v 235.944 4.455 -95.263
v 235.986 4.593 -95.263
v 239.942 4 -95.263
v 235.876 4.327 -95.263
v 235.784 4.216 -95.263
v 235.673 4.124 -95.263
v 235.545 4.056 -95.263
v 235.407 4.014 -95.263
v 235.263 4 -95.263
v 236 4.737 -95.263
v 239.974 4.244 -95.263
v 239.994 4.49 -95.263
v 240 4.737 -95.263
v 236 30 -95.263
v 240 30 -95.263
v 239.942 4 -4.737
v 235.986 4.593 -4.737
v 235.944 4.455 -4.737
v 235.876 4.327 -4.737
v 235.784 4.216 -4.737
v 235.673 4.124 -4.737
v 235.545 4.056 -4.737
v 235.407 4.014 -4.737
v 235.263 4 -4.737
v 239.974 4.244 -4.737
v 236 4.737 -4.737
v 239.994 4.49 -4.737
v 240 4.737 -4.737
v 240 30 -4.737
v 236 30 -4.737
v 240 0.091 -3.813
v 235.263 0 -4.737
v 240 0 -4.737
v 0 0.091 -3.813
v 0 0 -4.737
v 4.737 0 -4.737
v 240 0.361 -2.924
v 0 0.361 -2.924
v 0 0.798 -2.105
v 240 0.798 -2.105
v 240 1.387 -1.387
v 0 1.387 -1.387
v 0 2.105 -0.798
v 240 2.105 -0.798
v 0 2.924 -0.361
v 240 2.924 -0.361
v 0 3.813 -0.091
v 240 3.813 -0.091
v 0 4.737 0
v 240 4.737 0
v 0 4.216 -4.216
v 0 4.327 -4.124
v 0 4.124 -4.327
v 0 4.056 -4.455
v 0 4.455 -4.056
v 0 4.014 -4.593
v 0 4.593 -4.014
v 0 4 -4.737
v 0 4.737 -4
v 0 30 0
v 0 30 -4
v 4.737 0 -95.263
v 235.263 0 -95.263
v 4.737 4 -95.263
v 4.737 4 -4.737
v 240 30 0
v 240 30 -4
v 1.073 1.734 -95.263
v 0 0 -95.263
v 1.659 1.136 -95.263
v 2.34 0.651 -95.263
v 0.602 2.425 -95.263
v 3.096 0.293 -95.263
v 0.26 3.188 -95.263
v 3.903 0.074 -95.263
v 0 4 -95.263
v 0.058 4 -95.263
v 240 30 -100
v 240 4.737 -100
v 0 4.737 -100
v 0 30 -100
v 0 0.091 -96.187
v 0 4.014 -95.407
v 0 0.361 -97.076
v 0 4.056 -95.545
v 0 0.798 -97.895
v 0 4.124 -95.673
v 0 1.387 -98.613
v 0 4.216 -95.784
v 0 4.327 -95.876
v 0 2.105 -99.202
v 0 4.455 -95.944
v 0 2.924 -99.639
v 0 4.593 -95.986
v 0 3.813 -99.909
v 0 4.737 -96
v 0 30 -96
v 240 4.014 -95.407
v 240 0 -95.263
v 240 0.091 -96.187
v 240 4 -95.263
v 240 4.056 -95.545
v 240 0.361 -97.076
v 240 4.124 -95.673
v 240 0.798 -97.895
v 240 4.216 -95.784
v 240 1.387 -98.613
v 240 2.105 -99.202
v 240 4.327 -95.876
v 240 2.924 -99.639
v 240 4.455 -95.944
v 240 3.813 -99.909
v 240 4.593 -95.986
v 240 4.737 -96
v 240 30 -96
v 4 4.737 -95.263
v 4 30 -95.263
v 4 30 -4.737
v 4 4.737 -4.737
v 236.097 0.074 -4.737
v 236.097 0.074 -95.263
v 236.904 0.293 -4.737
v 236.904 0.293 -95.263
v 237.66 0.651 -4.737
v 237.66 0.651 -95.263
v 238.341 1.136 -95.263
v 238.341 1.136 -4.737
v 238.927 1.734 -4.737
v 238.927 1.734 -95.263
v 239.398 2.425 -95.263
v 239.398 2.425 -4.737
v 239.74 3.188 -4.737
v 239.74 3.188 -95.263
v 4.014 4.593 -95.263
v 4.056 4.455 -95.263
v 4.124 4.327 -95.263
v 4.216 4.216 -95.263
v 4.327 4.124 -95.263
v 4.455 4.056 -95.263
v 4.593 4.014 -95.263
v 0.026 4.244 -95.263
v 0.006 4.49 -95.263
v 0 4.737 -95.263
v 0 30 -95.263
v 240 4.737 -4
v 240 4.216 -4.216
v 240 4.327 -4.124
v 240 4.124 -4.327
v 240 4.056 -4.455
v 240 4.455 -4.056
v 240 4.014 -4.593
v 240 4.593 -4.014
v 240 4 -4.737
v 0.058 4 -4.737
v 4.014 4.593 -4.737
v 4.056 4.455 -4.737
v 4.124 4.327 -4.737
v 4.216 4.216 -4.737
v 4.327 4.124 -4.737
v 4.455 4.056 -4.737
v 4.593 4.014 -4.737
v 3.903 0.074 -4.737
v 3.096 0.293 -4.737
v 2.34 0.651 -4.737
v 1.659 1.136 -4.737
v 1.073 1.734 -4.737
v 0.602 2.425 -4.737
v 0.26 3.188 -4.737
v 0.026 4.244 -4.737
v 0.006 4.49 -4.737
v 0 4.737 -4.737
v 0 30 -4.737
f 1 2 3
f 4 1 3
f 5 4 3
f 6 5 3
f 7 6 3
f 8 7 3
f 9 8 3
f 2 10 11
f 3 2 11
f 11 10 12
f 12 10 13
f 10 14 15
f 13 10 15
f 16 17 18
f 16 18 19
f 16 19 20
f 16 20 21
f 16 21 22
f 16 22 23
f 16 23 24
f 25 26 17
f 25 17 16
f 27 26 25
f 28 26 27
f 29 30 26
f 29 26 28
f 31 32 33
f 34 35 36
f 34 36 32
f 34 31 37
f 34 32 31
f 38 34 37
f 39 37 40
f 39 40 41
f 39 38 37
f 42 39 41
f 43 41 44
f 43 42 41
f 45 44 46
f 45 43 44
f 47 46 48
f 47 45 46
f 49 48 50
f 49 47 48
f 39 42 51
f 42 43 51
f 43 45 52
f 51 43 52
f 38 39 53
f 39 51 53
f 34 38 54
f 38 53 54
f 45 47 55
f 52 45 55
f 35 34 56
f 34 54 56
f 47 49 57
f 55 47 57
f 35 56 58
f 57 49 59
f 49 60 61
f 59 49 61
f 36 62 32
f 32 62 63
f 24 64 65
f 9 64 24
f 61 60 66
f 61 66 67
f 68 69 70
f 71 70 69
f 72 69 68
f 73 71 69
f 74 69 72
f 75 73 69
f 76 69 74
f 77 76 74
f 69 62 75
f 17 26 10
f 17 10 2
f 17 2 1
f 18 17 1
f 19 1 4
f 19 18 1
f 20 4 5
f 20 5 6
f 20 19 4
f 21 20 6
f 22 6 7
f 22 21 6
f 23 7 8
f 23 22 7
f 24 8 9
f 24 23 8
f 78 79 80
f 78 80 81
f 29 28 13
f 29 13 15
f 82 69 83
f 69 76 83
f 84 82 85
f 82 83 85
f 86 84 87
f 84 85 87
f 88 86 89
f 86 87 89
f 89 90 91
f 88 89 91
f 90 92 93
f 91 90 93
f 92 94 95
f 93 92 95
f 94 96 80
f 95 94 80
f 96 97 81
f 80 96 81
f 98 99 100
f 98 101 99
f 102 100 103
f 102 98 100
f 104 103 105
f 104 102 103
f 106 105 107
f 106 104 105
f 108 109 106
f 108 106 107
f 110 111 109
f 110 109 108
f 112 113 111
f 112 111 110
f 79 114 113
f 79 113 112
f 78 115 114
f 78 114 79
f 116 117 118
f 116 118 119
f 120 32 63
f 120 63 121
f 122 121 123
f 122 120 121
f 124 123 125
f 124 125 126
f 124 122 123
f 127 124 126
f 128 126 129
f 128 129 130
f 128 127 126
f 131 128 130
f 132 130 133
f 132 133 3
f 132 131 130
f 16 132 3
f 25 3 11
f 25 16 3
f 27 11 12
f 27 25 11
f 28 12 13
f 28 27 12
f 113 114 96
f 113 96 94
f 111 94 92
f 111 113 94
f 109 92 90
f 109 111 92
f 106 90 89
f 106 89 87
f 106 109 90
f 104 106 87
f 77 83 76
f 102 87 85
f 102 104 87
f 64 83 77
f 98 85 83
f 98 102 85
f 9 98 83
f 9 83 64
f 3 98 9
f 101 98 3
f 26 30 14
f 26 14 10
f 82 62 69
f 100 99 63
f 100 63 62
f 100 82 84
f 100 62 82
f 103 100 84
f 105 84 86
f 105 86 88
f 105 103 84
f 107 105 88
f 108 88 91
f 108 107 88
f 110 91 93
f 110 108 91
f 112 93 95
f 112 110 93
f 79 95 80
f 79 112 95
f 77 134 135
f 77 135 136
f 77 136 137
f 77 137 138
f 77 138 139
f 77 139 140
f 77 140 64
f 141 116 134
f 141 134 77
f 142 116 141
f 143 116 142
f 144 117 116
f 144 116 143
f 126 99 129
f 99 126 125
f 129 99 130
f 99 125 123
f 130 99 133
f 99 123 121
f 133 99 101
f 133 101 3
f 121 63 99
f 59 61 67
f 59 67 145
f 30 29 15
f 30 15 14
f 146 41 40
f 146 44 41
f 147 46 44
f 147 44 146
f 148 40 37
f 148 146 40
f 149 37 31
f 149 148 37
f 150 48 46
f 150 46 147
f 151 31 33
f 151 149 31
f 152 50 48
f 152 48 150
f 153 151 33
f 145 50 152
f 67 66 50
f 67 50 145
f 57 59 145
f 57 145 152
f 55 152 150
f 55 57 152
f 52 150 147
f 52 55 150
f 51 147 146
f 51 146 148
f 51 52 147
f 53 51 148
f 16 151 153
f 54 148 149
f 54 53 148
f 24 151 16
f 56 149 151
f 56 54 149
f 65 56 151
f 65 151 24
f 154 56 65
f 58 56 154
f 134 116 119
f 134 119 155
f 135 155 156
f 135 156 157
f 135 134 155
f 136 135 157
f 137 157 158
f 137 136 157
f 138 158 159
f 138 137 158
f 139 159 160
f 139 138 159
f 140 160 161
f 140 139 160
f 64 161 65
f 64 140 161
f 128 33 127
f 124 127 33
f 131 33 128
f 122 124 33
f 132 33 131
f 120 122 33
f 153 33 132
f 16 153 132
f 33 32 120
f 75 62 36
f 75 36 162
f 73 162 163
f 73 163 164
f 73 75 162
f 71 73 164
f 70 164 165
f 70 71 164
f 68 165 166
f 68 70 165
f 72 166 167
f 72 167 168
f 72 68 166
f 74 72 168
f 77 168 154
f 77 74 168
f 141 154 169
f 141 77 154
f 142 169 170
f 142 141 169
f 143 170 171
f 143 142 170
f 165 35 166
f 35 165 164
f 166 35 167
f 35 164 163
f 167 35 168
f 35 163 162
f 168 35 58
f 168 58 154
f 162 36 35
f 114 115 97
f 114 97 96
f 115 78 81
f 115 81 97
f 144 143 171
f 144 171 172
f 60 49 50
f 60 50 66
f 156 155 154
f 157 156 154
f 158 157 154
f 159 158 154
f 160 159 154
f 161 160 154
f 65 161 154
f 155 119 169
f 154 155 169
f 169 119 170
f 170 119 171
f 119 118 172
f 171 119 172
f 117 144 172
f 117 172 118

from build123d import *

# Parameters (mm, degrees)
CROQUIS2_W                         = 240
CROQUIS2_H                         = 100
BRIDA_BASE1_DEPTH                  = 4
BRIDA_DE_ARISTA1_STRIP_W           = 17.4732
BRIDA_DE_ARISTA1_STRIP_H           = 4
BRIDA_DE_ARISTA1_STRIP_CUT_DEPTH   = 240
BRIDA_DE_ARISTA1_STRIP_2_W         = 17.4732
BRIDA_DE_ARISTA1_STRIP_2_H         = 4
BRIDA_DE_ARISTA1_STRIP_CUT_2_DEPTH = 240
BRIDA_DE_ARISTA1_DEPTH             = 240
BRIDA_DE_ARISTA1_BEND_DEPTH        = 240
BRIDA_DE_ARISTA2_STRIP_W           = 17.4732
BRIDA_DE_ARISTA2_STRIP_H           = 4
BRIDA_DE_ARISTA2_STRIP_CUT_DEPTH   = 90.5268
BRIDA_DE_ARISTA2_STRIP_2_W         = 17.4732
BRIDA_DE_ARISTA2_STRIP_2_H         = 4
BRIDA_DE_ARISTA2_STRIP_CUT_2_DEPTH = 90.5268
BRIDA_DE_ARISTA2_DEPTH             = 90.5268
BRIDA_DE_ARISTA2_BEND_DEPTH        = 90.5268


# Sheet-metal steps are written as plain solids
with BuildPart() as part:
    # Croquis2 → Brida base1 (new body)
    with BuildSketch(Plane(origin=(0, 0, 0), x_dir=(1, 0, 0), z_dir=(0, 1, 0))):
        with Locations((120, 50)):
            Rectangle(CROQUIS2_W, CROQUIS2_H)
    extrude(amount=BRIDA_BASE1_DEPTH)

    # Brida de arista1 strip (across the edge) → Brida de arista1 strip cut (cut)
    with BuildSketch(Plane(origin=(0, 4, 0), x_dir=(0, 0, -1), z_dir=(1, 0, 0))):
        with Locations((-4, -2)):
            Rectangle(BRIDA_DE_ARISTA1_STRIP_W, BRIDA_DE_ARISTA1_STRIP_H)
    extrude(amount=BRIDA_DE_ARISTA1_STRIP_CUT_DEPTH, mode=Mode.SUBTRACT)

    # Brida de arista1 strip 2 (across the edge) → Brida de arista1 strip cut 2 (cut)
    with BuildSketch(Plane(origin=(240, 4, -100), x_dir=(0, 0, 1), z_dir=(-1, 0, 0))):
        with Locations((-4, -2)):
            Rectangle(BRIDA_DE_ARISTA1_STRIP_2_W, BRIDA_DE_ARISTA1_STRIP_2_H)
    extrude(amount=BRIDA_DE_ARISTA1_STRIP_CUT_2_DEPTH, mode=Mode.SUBTRACT)

    # Brida de arista1 section (across the edge) → Brida de arista1 (add)
    with BuildSketch(Plane(origin=(0, 4, 0), x_dir=(0, 0, -1), z_dir=(1, 0, 0))):
        with BuildLine():
            Line((0, 0.7366), (0, 26))
            Line((0, 26), (4, 26))
            Line((4, 26), (4, 0.7366))
            ThreePointArc((4, 0.7366), (4.215745145, 0.215745145), (4.7366, 0))
            Line((4.7366, 0), (4.7366, -4))
            ThreePointArc((4.7366, -4), (1.38731802, -2.61268198), (0, 0.7366))
        make_face()
    extrude(amount=BRIDA_DE_ARISTA1_DEPTH)

    # Brida de arista1 section 2 (across the edge) → Brida de arista1 bend (add)
    with BuildSketch(Plane(origin=(240, 4, -100), x_dir=(0, 0, 1), z_dir=(-1, 0, 0))):
        with BuildLine():
            Line((0, 0.7366), (0, 26))
            Line((0, 26), (4, 26))
            Line((4, 26), (4, 0.7366))
            ThreePointArc((4, 0.7366), (4.215745145, 0.215745145), (4.7366, 0))
            Line((4.7366, 0), (4.7366, -4))
            ThreePointArc((4.7366, -4), (1.38731802, -2.61268198), (0, 0.7366))
        make_face()
    extrude(amount=BRIDA_DE_ARISTA1_BEND_DEPTH)

    # Brida de arista2 strip (across the edge) → Brida de arista2 strip cut (cut)
    with BuildSketch(Plane(origin=(240, 4, -4.7366), x_dir=(-1, 0, 0), z_dir=(0, 0, -1))):
        with Locations((-4, -2)):
            Rectangle(BRIDA_DE_ARISTA2_STRIP_W, BRIDA_DE_ARISTA2_STRIP_H)
    extrude(amount=BRIDA_DE_ARISTA2_STRIP_CUT_DEPTH, mode=Mode.SUBTRACT)

    # Brida de arista2 strip 2 (across the edge) → Brida de arista2 strip cut 2 (cut)
    with BuildSketch(Plane(origin=(0, 4, -95.2634), x_dir=(1, 0, 0), z_dir=(0, 0, 1))):
        with Locations((-4, -2)):
            Rectangle(BRIDA_DE_ARISTA2_STRIP_2_W, BRIDA_DE_ARISTA2_STRIP_2_H)
    extrude(amount=BRIDA_DE_ARISTA2_STRIP_CUT_2_DEPTH, mode=Mode.SUBTRACT)

    # Brida de arista2 section (across the edge) → Brida de arista2 (add)
    with BuildSketch(Plane(origin=(240, 4, -4.7366), x_dir=(-1, 0, 0), z_dir=(0, 0, -1))):
        with BuildLine():
            Line((0, 0.7366), (0, 26))
            Line((0, 26), (4, 26))
            Line((4, 26), (4, 0.7366))
            ThreePointArc((4, 0.7366), (4.215745145, 0.215745145), (4.7366, 0))
            Line((4.7366, 0), (4.7366, -4))
            ThreePointArc((4.7366, -4), (1.38731802, -2.61268198), (0, 0.7366))
        make_face()
    extrude(amount=BRIDA_DE_ARISTA2_DEPTH)

    # Brida de arista2 section 2 (across the edge) → Brida de arista2 bend (add)
    with BuildSketch(Plane(origin=(0, 4, -95.2634), x_dir=(1, 0, 0), z_dir=(0, 0, 1))):
        with BuildLine():
            Line((0, 0.7366), (0, 26))
            Line((0, 26), (4, 26))
            Line((4, 26), (4, 0.7366))
            ThreePointArc((4, 0.7366), (4.215745145, 0.215745145), (4.7366, 0))
            Line((4.7366, 0), (4.7366, -4))
            ThreePointArc((4.7366, -4), (1.38731802, -2.61268198), (0, 0.7366))
        make_face()
    extrude(amount=BRIDA_DE_ARISTA2_BEND_DEPTH)


solid = part.part
